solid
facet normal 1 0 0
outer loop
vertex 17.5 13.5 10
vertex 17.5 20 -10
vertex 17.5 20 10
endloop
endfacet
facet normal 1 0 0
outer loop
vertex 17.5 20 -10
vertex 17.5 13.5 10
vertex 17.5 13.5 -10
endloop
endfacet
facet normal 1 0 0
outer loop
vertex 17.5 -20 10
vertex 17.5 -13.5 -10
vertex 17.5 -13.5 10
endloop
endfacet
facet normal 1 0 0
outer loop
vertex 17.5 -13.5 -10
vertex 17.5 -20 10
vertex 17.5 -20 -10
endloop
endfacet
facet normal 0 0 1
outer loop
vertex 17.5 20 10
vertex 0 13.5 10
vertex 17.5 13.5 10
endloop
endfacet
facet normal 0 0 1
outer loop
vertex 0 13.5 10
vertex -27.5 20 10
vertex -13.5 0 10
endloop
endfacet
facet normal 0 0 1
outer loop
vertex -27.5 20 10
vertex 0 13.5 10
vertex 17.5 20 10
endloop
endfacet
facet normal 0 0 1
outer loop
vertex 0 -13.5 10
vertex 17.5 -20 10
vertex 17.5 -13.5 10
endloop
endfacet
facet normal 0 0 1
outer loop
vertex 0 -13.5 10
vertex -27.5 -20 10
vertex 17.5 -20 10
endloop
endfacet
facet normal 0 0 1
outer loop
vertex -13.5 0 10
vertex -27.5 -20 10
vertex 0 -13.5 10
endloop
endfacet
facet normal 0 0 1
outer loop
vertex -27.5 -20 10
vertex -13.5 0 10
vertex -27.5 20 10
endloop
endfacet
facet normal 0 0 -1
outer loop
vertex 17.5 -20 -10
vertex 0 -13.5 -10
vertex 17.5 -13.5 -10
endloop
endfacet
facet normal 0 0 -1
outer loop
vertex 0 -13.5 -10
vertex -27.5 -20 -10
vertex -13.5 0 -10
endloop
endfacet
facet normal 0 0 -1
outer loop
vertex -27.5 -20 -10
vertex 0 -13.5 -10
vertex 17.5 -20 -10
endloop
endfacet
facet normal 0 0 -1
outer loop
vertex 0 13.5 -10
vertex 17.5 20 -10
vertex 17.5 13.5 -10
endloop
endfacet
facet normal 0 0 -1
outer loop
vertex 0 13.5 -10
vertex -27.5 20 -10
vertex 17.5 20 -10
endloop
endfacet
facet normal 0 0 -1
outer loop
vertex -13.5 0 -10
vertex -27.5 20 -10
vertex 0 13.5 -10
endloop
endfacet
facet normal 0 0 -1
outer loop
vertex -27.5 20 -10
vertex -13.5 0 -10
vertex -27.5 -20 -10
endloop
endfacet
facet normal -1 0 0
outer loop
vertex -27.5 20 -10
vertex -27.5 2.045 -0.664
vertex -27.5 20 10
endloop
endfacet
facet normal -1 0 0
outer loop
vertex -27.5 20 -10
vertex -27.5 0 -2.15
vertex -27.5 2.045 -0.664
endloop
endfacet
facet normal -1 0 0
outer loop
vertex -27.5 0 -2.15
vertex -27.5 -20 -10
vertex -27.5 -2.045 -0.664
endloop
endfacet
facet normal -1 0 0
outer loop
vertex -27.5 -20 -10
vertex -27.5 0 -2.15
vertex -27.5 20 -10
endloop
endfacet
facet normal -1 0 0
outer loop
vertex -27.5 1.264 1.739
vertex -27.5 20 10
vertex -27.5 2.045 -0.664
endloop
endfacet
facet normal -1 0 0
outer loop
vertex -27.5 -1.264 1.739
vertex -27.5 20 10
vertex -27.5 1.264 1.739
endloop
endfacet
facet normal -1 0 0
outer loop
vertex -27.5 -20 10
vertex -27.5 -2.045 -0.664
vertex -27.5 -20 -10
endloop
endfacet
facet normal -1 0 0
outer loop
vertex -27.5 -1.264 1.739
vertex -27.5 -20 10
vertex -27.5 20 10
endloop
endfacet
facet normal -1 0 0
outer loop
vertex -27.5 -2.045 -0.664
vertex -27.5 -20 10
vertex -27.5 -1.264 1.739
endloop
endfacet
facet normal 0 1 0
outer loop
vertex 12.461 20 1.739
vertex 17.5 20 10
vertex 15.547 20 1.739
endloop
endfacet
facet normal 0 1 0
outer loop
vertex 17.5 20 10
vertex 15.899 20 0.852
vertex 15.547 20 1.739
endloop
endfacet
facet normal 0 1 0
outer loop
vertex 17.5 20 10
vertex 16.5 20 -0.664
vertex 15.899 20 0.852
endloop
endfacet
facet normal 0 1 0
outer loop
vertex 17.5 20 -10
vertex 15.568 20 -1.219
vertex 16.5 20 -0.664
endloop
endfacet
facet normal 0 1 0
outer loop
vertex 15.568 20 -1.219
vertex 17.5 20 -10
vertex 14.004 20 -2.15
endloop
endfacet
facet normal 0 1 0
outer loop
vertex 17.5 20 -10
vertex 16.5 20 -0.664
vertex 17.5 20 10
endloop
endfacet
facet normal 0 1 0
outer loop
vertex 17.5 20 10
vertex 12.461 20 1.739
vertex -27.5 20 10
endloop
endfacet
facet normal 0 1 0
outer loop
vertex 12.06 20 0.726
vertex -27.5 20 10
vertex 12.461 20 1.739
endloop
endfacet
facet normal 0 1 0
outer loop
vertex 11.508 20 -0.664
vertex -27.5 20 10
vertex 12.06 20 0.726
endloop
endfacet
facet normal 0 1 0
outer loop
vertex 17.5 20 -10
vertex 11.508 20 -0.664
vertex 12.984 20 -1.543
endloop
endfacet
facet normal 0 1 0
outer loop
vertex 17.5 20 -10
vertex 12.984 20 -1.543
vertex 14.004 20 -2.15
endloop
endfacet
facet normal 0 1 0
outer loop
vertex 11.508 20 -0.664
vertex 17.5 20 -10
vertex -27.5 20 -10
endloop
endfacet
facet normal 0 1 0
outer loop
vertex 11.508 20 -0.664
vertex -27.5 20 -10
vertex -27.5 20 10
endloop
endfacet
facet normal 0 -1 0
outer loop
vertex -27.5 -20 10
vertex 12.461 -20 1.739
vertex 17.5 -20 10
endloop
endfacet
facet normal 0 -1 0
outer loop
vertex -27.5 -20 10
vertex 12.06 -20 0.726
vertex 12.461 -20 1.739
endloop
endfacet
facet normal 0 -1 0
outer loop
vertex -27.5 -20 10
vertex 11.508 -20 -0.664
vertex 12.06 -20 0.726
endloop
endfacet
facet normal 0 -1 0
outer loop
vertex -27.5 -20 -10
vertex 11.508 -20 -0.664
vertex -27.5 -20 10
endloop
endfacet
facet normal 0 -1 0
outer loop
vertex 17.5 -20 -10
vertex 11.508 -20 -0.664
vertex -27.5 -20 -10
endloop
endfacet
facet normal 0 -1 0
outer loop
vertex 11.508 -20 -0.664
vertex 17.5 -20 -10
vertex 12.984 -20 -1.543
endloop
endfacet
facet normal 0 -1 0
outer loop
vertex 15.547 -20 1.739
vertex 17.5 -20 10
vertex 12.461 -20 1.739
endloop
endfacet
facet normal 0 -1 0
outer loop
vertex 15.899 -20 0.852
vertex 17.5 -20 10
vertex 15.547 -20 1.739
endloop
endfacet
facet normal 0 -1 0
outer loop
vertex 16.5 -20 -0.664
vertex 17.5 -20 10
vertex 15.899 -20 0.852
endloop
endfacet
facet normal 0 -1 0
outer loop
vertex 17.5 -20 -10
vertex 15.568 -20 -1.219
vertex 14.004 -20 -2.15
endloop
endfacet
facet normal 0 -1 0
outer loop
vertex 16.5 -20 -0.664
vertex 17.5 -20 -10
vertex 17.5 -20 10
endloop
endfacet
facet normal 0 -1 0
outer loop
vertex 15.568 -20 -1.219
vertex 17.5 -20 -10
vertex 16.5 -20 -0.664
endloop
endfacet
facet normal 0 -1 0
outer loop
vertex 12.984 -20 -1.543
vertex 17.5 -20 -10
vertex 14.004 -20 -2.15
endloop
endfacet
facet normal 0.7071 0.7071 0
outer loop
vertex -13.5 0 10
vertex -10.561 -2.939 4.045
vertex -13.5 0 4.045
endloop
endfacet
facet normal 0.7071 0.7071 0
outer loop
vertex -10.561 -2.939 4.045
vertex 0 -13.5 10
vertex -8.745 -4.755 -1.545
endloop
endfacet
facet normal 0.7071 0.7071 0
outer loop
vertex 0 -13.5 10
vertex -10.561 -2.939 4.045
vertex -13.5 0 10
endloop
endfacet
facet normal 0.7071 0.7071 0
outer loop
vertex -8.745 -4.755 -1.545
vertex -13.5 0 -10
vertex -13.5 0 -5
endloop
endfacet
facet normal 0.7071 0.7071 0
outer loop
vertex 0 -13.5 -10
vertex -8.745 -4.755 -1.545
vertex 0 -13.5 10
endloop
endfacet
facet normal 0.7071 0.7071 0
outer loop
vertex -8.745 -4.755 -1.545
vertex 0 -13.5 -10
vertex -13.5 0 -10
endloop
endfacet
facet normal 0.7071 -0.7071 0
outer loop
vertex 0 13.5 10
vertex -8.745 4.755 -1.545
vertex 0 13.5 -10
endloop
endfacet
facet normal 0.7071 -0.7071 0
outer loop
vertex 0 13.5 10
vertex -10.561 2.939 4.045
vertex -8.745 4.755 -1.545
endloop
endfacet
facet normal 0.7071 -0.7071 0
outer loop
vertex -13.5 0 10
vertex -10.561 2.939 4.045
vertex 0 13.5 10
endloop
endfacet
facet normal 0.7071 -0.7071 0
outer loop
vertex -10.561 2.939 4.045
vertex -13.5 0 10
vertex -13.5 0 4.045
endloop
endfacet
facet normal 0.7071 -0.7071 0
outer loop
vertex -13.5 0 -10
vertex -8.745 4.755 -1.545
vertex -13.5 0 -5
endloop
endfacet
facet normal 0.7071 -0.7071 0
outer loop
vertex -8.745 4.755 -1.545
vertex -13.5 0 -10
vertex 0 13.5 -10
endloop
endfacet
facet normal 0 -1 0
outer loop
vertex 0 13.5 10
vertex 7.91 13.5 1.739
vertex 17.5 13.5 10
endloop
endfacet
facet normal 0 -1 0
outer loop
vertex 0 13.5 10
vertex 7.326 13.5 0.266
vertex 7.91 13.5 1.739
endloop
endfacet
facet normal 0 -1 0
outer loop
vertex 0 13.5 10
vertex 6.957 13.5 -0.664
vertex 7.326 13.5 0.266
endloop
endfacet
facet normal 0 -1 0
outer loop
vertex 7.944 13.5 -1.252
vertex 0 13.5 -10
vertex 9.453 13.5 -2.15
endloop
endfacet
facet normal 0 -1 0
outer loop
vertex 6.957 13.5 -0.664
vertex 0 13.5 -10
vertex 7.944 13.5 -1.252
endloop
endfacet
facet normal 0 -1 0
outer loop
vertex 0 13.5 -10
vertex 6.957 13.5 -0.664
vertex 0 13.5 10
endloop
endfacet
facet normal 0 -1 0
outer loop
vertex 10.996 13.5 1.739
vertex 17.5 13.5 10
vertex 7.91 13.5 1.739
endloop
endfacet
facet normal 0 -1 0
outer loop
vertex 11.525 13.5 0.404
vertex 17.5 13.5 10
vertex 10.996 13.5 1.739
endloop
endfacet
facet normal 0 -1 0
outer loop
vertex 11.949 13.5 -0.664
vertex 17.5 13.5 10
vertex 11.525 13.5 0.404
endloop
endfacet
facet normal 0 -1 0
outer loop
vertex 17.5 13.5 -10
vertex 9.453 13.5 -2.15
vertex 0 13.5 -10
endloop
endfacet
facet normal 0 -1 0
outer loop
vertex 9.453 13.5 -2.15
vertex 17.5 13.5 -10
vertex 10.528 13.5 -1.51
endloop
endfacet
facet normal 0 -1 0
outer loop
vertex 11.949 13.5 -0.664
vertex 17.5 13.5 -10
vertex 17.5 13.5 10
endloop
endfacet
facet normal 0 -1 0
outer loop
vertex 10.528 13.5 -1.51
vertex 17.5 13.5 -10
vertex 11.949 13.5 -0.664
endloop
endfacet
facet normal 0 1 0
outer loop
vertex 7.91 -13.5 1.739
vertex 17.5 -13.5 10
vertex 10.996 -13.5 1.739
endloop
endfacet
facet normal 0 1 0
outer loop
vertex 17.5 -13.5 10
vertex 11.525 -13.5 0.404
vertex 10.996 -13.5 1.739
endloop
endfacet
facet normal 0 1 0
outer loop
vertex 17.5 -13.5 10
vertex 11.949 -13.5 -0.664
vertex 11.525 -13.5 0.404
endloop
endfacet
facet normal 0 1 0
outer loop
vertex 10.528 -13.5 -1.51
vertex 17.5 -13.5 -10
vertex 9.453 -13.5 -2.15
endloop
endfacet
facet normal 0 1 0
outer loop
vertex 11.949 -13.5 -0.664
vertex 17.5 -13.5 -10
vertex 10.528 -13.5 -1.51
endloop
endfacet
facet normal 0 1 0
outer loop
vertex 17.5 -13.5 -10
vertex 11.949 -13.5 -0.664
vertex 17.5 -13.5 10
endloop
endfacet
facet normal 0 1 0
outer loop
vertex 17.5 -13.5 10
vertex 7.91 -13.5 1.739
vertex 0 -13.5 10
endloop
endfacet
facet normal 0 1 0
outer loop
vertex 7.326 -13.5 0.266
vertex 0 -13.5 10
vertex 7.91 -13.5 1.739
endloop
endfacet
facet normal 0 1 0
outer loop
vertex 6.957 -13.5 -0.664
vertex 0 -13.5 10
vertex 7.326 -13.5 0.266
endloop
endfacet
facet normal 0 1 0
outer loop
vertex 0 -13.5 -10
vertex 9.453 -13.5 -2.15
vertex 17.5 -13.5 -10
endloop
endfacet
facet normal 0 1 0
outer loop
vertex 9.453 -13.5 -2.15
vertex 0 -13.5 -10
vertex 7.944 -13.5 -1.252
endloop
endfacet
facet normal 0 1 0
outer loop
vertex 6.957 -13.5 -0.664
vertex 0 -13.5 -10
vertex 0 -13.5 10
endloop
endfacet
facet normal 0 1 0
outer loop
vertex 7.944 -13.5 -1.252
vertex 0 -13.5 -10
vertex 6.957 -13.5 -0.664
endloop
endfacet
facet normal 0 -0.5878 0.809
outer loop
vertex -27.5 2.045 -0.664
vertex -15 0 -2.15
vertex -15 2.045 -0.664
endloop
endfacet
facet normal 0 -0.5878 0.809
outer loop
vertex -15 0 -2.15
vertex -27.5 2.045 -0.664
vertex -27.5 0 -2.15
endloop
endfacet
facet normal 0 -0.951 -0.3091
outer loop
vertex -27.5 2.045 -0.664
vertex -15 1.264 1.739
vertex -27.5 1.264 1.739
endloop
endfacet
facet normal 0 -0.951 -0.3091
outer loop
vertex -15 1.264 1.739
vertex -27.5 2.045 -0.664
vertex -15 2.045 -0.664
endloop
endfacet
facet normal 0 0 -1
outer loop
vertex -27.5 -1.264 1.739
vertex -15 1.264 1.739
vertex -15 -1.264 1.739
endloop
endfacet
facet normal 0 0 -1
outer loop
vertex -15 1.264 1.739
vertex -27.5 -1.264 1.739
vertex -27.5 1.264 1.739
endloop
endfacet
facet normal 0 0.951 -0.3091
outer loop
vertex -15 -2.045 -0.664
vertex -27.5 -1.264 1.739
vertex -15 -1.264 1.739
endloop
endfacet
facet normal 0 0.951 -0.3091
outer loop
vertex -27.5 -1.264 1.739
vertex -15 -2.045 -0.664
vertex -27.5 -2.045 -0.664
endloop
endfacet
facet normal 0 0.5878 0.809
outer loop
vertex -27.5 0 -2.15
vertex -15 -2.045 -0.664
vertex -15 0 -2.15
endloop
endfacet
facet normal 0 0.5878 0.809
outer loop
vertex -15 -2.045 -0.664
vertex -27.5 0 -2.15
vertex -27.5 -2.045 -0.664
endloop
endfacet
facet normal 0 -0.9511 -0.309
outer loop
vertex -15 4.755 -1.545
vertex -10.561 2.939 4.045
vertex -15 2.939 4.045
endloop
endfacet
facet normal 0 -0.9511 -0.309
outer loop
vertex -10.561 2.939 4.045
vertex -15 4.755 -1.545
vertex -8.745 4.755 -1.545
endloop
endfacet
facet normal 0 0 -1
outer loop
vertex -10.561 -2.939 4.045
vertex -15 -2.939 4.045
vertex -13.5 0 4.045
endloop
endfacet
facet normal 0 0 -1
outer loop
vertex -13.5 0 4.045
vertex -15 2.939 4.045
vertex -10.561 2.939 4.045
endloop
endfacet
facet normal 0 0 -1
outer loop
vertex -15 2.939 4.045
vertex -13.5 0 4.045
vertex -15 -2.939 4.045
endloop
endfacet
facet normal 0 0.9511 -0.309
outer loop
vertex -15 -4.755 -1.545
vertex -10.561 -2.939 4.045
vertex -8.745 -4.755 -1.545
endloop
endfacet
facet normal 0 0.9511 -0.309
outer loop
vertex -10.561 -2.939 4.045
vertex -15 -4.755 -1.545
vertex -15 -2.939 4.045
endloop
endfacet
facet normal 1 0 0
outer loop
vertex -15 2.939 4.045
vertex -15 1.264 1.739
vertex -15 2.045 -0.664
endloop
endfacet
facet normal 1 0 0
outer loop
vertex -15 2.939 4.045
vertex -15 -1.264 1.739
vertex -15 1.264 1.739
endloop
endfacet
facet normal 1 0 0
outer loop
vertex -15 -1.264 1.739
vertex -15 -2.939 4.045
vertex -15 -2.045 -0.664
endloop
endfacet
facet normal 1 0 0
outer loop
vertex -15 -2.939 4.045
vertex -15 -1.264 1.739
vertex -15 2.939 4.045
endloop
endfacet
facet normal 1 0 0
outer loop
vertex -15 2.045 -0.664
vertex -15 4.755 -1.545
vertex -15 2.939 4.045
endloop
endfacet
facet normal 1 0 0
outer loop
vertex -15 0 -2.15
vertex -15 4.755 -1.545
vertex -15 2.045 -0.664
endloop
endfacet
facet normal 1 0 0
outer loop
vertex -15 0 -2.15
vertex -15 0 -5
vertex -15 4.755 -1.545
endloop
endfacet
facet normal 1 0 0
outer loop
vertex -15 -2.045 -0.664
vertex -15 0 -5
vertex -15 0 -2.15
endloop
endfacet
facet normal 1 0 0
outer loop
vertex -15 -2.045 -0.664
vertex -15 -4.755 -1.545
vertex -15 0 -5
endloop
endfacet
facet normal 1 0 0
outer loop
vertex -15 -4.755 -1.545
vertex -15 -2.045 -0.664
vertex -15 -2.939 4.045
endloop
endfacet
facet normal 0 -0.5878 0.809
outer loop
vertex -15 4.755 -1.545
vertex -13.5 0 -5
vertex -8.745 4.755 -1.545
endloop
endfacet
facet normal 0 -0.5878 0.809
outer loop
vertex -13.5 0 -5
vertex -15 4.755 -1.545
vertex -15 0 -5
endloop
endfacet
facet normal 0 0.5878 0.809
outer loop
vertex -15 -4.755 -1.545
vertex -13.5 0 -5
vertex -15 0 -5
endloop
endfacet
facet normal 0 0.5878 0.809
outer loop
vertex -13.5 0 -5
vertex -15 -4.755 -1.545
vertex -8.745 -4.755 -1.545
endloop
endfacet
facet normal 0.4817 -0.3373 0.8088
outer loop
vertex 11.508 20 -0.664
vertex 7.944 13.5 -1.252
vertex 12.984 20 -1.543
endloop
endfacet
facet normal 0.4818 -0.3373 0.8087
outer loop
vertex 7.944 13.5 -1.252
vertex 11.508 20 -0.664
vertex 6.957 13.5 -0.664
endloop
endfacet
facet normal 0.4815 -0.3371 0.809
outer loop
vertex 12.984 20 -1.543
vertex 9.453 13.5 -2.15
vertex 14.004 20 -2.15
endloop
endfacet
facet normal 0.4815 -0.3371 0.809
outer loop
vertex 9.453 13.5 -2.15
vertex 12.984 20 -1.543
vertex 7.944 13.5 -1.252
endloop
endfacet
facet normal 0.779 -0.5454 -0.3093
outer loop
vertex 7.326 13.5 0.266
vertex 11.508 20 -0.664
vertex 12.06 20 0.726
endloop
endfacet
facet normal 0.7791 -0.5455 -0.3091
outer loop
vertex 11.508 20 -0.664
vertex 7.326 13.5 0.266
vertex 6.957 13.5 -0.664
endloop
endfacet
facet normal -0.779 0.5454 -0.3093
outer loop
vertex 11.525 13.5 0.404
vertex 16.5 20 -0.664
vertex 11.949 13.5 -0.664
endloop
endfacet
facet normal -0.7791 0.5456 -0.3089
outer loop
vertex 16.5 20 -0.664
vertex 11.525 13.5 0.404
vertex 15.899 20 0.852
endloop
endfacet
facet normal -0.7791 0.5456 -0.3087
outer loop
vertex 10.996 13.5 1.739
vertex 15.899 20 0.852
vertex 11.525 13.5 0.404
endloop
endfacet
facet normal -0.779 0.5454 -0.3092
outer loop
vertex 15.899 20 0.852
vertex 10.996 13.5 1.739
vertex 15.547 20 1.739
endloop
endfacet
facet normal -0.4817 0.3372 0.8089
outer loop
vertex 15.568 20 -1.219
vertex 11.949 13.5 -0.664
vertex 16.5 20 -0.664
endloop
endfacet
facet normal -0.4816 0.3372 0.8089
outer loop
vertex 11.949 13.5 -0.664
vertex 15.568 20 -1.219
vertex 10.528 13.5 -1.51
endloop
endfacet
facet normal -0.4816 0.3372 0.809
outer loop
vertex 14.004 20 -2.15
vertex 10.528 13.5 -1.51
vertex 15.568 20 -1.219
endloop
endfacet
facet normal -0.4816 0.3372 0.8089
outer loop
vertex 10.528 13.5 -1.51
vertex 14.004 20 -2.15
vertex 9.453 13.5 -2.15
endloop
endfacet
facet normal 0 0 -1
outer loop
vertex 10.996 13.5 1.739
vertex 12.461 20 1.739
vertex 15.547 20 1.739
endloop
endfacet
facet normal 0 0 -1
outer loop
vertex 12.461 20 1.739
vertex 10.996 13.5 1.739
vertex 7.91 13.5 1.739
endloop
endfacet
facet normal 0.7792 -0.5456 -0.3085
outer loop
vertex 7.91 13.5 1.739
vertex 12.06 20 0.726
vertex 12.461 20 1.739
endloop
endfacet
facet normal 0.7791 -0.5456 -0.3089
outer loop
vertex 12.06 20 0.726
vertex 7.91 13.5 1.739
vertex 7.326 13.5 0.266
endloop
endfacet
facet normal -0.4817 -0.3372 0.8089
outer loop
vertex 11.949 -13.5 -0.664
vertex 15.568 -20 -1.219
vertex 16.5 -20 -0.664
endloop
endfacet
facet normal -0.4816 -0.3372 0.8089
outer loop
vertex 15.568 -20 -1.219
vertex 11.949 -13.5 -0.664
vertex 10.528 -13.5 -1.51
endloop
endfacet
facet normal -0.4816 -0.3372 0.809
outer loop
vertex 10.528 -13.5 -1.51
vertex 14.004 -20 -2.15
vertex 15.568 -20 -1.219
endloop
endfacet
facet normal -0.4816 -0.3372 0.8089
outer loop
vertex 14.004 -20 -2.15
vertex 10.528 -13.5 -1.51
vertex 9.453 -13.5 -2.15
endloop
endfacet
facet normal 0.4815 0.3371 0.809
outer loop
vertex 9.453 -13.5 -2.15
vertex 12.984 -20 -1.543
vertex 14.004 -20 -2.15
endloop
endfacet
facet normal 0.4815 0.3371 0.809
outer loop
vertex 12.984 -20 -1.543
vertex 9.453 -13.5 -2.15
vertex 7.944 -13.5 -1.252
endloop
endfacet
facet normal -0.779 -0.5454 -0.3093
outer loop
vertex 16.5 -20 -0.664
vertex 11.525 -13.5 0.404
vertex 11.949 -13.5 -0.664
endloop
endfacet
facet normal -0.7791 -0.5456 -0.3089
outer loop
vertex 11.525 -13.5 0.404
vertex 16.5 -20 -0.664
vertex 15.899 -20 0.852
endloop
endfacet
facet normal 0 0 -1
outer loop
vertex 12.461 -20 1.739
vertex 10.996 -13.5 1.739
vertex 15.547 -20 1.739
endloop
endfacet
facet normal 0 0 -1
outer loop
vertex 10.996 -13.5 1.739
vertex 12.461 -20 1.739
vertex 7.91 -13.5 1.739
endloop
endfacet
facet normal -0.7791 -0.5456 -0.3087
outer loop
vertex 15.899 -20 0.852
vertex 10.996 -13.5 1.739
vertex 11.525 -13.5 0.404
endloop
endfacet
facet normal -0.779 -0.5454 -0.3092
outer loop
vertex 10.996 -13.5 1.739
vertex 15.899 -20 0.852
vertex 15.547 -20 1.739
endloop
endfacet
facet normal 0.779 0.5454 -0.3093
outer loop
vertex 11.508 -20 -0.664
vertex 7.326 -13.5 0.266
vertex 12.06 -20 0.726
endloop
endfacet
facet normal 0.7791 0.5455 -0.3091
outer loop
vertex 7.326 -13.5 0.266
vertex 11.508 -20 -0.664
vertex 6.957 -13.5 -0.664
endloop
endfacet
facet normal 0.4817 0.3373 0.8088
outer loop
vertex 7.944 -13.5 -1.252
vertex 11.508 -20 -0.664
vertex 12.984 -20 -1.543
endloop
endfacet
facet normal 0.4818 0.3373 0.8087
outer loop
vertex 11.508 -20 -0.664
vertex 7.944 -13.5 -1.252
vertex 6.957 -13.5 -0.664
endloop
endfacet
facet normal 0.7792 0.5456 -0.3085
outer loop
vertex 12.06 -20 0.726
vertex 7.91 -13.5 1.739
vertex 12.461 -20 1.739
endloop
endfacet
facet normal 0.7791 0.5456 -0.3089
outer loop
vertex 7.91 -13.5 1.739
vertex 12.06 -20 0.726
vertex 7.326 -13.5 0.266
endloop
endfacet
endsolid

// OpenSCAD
difference() {
    translate([-5,0,0]) cube([45,40,20], true);
    translate([0,0,0]) rotate([0,0,45]) cube([27/sqrt(2),27/sqrt(2),21], true);
    translate([27/2,0,0]) cube([27,27,21], true);
    rotate([0,90,0]) cylinder(d=4.3, h=70, center=true, $fn=5);
    rotate([0,90,0]) cylinder(d=10, h=30, center=true, $fn=5);
    rotate([0,0,55]) translate([20,0,0]) rotate([0,90,0]) cylinder(d=4.3, h=42, center=true, $fn=5);
    rotate([0,0,-55]) translate([20,0,0]) rotate([0,90,0]) cylinder(d=4.3, h=42, center=true, $fn=5);
}
